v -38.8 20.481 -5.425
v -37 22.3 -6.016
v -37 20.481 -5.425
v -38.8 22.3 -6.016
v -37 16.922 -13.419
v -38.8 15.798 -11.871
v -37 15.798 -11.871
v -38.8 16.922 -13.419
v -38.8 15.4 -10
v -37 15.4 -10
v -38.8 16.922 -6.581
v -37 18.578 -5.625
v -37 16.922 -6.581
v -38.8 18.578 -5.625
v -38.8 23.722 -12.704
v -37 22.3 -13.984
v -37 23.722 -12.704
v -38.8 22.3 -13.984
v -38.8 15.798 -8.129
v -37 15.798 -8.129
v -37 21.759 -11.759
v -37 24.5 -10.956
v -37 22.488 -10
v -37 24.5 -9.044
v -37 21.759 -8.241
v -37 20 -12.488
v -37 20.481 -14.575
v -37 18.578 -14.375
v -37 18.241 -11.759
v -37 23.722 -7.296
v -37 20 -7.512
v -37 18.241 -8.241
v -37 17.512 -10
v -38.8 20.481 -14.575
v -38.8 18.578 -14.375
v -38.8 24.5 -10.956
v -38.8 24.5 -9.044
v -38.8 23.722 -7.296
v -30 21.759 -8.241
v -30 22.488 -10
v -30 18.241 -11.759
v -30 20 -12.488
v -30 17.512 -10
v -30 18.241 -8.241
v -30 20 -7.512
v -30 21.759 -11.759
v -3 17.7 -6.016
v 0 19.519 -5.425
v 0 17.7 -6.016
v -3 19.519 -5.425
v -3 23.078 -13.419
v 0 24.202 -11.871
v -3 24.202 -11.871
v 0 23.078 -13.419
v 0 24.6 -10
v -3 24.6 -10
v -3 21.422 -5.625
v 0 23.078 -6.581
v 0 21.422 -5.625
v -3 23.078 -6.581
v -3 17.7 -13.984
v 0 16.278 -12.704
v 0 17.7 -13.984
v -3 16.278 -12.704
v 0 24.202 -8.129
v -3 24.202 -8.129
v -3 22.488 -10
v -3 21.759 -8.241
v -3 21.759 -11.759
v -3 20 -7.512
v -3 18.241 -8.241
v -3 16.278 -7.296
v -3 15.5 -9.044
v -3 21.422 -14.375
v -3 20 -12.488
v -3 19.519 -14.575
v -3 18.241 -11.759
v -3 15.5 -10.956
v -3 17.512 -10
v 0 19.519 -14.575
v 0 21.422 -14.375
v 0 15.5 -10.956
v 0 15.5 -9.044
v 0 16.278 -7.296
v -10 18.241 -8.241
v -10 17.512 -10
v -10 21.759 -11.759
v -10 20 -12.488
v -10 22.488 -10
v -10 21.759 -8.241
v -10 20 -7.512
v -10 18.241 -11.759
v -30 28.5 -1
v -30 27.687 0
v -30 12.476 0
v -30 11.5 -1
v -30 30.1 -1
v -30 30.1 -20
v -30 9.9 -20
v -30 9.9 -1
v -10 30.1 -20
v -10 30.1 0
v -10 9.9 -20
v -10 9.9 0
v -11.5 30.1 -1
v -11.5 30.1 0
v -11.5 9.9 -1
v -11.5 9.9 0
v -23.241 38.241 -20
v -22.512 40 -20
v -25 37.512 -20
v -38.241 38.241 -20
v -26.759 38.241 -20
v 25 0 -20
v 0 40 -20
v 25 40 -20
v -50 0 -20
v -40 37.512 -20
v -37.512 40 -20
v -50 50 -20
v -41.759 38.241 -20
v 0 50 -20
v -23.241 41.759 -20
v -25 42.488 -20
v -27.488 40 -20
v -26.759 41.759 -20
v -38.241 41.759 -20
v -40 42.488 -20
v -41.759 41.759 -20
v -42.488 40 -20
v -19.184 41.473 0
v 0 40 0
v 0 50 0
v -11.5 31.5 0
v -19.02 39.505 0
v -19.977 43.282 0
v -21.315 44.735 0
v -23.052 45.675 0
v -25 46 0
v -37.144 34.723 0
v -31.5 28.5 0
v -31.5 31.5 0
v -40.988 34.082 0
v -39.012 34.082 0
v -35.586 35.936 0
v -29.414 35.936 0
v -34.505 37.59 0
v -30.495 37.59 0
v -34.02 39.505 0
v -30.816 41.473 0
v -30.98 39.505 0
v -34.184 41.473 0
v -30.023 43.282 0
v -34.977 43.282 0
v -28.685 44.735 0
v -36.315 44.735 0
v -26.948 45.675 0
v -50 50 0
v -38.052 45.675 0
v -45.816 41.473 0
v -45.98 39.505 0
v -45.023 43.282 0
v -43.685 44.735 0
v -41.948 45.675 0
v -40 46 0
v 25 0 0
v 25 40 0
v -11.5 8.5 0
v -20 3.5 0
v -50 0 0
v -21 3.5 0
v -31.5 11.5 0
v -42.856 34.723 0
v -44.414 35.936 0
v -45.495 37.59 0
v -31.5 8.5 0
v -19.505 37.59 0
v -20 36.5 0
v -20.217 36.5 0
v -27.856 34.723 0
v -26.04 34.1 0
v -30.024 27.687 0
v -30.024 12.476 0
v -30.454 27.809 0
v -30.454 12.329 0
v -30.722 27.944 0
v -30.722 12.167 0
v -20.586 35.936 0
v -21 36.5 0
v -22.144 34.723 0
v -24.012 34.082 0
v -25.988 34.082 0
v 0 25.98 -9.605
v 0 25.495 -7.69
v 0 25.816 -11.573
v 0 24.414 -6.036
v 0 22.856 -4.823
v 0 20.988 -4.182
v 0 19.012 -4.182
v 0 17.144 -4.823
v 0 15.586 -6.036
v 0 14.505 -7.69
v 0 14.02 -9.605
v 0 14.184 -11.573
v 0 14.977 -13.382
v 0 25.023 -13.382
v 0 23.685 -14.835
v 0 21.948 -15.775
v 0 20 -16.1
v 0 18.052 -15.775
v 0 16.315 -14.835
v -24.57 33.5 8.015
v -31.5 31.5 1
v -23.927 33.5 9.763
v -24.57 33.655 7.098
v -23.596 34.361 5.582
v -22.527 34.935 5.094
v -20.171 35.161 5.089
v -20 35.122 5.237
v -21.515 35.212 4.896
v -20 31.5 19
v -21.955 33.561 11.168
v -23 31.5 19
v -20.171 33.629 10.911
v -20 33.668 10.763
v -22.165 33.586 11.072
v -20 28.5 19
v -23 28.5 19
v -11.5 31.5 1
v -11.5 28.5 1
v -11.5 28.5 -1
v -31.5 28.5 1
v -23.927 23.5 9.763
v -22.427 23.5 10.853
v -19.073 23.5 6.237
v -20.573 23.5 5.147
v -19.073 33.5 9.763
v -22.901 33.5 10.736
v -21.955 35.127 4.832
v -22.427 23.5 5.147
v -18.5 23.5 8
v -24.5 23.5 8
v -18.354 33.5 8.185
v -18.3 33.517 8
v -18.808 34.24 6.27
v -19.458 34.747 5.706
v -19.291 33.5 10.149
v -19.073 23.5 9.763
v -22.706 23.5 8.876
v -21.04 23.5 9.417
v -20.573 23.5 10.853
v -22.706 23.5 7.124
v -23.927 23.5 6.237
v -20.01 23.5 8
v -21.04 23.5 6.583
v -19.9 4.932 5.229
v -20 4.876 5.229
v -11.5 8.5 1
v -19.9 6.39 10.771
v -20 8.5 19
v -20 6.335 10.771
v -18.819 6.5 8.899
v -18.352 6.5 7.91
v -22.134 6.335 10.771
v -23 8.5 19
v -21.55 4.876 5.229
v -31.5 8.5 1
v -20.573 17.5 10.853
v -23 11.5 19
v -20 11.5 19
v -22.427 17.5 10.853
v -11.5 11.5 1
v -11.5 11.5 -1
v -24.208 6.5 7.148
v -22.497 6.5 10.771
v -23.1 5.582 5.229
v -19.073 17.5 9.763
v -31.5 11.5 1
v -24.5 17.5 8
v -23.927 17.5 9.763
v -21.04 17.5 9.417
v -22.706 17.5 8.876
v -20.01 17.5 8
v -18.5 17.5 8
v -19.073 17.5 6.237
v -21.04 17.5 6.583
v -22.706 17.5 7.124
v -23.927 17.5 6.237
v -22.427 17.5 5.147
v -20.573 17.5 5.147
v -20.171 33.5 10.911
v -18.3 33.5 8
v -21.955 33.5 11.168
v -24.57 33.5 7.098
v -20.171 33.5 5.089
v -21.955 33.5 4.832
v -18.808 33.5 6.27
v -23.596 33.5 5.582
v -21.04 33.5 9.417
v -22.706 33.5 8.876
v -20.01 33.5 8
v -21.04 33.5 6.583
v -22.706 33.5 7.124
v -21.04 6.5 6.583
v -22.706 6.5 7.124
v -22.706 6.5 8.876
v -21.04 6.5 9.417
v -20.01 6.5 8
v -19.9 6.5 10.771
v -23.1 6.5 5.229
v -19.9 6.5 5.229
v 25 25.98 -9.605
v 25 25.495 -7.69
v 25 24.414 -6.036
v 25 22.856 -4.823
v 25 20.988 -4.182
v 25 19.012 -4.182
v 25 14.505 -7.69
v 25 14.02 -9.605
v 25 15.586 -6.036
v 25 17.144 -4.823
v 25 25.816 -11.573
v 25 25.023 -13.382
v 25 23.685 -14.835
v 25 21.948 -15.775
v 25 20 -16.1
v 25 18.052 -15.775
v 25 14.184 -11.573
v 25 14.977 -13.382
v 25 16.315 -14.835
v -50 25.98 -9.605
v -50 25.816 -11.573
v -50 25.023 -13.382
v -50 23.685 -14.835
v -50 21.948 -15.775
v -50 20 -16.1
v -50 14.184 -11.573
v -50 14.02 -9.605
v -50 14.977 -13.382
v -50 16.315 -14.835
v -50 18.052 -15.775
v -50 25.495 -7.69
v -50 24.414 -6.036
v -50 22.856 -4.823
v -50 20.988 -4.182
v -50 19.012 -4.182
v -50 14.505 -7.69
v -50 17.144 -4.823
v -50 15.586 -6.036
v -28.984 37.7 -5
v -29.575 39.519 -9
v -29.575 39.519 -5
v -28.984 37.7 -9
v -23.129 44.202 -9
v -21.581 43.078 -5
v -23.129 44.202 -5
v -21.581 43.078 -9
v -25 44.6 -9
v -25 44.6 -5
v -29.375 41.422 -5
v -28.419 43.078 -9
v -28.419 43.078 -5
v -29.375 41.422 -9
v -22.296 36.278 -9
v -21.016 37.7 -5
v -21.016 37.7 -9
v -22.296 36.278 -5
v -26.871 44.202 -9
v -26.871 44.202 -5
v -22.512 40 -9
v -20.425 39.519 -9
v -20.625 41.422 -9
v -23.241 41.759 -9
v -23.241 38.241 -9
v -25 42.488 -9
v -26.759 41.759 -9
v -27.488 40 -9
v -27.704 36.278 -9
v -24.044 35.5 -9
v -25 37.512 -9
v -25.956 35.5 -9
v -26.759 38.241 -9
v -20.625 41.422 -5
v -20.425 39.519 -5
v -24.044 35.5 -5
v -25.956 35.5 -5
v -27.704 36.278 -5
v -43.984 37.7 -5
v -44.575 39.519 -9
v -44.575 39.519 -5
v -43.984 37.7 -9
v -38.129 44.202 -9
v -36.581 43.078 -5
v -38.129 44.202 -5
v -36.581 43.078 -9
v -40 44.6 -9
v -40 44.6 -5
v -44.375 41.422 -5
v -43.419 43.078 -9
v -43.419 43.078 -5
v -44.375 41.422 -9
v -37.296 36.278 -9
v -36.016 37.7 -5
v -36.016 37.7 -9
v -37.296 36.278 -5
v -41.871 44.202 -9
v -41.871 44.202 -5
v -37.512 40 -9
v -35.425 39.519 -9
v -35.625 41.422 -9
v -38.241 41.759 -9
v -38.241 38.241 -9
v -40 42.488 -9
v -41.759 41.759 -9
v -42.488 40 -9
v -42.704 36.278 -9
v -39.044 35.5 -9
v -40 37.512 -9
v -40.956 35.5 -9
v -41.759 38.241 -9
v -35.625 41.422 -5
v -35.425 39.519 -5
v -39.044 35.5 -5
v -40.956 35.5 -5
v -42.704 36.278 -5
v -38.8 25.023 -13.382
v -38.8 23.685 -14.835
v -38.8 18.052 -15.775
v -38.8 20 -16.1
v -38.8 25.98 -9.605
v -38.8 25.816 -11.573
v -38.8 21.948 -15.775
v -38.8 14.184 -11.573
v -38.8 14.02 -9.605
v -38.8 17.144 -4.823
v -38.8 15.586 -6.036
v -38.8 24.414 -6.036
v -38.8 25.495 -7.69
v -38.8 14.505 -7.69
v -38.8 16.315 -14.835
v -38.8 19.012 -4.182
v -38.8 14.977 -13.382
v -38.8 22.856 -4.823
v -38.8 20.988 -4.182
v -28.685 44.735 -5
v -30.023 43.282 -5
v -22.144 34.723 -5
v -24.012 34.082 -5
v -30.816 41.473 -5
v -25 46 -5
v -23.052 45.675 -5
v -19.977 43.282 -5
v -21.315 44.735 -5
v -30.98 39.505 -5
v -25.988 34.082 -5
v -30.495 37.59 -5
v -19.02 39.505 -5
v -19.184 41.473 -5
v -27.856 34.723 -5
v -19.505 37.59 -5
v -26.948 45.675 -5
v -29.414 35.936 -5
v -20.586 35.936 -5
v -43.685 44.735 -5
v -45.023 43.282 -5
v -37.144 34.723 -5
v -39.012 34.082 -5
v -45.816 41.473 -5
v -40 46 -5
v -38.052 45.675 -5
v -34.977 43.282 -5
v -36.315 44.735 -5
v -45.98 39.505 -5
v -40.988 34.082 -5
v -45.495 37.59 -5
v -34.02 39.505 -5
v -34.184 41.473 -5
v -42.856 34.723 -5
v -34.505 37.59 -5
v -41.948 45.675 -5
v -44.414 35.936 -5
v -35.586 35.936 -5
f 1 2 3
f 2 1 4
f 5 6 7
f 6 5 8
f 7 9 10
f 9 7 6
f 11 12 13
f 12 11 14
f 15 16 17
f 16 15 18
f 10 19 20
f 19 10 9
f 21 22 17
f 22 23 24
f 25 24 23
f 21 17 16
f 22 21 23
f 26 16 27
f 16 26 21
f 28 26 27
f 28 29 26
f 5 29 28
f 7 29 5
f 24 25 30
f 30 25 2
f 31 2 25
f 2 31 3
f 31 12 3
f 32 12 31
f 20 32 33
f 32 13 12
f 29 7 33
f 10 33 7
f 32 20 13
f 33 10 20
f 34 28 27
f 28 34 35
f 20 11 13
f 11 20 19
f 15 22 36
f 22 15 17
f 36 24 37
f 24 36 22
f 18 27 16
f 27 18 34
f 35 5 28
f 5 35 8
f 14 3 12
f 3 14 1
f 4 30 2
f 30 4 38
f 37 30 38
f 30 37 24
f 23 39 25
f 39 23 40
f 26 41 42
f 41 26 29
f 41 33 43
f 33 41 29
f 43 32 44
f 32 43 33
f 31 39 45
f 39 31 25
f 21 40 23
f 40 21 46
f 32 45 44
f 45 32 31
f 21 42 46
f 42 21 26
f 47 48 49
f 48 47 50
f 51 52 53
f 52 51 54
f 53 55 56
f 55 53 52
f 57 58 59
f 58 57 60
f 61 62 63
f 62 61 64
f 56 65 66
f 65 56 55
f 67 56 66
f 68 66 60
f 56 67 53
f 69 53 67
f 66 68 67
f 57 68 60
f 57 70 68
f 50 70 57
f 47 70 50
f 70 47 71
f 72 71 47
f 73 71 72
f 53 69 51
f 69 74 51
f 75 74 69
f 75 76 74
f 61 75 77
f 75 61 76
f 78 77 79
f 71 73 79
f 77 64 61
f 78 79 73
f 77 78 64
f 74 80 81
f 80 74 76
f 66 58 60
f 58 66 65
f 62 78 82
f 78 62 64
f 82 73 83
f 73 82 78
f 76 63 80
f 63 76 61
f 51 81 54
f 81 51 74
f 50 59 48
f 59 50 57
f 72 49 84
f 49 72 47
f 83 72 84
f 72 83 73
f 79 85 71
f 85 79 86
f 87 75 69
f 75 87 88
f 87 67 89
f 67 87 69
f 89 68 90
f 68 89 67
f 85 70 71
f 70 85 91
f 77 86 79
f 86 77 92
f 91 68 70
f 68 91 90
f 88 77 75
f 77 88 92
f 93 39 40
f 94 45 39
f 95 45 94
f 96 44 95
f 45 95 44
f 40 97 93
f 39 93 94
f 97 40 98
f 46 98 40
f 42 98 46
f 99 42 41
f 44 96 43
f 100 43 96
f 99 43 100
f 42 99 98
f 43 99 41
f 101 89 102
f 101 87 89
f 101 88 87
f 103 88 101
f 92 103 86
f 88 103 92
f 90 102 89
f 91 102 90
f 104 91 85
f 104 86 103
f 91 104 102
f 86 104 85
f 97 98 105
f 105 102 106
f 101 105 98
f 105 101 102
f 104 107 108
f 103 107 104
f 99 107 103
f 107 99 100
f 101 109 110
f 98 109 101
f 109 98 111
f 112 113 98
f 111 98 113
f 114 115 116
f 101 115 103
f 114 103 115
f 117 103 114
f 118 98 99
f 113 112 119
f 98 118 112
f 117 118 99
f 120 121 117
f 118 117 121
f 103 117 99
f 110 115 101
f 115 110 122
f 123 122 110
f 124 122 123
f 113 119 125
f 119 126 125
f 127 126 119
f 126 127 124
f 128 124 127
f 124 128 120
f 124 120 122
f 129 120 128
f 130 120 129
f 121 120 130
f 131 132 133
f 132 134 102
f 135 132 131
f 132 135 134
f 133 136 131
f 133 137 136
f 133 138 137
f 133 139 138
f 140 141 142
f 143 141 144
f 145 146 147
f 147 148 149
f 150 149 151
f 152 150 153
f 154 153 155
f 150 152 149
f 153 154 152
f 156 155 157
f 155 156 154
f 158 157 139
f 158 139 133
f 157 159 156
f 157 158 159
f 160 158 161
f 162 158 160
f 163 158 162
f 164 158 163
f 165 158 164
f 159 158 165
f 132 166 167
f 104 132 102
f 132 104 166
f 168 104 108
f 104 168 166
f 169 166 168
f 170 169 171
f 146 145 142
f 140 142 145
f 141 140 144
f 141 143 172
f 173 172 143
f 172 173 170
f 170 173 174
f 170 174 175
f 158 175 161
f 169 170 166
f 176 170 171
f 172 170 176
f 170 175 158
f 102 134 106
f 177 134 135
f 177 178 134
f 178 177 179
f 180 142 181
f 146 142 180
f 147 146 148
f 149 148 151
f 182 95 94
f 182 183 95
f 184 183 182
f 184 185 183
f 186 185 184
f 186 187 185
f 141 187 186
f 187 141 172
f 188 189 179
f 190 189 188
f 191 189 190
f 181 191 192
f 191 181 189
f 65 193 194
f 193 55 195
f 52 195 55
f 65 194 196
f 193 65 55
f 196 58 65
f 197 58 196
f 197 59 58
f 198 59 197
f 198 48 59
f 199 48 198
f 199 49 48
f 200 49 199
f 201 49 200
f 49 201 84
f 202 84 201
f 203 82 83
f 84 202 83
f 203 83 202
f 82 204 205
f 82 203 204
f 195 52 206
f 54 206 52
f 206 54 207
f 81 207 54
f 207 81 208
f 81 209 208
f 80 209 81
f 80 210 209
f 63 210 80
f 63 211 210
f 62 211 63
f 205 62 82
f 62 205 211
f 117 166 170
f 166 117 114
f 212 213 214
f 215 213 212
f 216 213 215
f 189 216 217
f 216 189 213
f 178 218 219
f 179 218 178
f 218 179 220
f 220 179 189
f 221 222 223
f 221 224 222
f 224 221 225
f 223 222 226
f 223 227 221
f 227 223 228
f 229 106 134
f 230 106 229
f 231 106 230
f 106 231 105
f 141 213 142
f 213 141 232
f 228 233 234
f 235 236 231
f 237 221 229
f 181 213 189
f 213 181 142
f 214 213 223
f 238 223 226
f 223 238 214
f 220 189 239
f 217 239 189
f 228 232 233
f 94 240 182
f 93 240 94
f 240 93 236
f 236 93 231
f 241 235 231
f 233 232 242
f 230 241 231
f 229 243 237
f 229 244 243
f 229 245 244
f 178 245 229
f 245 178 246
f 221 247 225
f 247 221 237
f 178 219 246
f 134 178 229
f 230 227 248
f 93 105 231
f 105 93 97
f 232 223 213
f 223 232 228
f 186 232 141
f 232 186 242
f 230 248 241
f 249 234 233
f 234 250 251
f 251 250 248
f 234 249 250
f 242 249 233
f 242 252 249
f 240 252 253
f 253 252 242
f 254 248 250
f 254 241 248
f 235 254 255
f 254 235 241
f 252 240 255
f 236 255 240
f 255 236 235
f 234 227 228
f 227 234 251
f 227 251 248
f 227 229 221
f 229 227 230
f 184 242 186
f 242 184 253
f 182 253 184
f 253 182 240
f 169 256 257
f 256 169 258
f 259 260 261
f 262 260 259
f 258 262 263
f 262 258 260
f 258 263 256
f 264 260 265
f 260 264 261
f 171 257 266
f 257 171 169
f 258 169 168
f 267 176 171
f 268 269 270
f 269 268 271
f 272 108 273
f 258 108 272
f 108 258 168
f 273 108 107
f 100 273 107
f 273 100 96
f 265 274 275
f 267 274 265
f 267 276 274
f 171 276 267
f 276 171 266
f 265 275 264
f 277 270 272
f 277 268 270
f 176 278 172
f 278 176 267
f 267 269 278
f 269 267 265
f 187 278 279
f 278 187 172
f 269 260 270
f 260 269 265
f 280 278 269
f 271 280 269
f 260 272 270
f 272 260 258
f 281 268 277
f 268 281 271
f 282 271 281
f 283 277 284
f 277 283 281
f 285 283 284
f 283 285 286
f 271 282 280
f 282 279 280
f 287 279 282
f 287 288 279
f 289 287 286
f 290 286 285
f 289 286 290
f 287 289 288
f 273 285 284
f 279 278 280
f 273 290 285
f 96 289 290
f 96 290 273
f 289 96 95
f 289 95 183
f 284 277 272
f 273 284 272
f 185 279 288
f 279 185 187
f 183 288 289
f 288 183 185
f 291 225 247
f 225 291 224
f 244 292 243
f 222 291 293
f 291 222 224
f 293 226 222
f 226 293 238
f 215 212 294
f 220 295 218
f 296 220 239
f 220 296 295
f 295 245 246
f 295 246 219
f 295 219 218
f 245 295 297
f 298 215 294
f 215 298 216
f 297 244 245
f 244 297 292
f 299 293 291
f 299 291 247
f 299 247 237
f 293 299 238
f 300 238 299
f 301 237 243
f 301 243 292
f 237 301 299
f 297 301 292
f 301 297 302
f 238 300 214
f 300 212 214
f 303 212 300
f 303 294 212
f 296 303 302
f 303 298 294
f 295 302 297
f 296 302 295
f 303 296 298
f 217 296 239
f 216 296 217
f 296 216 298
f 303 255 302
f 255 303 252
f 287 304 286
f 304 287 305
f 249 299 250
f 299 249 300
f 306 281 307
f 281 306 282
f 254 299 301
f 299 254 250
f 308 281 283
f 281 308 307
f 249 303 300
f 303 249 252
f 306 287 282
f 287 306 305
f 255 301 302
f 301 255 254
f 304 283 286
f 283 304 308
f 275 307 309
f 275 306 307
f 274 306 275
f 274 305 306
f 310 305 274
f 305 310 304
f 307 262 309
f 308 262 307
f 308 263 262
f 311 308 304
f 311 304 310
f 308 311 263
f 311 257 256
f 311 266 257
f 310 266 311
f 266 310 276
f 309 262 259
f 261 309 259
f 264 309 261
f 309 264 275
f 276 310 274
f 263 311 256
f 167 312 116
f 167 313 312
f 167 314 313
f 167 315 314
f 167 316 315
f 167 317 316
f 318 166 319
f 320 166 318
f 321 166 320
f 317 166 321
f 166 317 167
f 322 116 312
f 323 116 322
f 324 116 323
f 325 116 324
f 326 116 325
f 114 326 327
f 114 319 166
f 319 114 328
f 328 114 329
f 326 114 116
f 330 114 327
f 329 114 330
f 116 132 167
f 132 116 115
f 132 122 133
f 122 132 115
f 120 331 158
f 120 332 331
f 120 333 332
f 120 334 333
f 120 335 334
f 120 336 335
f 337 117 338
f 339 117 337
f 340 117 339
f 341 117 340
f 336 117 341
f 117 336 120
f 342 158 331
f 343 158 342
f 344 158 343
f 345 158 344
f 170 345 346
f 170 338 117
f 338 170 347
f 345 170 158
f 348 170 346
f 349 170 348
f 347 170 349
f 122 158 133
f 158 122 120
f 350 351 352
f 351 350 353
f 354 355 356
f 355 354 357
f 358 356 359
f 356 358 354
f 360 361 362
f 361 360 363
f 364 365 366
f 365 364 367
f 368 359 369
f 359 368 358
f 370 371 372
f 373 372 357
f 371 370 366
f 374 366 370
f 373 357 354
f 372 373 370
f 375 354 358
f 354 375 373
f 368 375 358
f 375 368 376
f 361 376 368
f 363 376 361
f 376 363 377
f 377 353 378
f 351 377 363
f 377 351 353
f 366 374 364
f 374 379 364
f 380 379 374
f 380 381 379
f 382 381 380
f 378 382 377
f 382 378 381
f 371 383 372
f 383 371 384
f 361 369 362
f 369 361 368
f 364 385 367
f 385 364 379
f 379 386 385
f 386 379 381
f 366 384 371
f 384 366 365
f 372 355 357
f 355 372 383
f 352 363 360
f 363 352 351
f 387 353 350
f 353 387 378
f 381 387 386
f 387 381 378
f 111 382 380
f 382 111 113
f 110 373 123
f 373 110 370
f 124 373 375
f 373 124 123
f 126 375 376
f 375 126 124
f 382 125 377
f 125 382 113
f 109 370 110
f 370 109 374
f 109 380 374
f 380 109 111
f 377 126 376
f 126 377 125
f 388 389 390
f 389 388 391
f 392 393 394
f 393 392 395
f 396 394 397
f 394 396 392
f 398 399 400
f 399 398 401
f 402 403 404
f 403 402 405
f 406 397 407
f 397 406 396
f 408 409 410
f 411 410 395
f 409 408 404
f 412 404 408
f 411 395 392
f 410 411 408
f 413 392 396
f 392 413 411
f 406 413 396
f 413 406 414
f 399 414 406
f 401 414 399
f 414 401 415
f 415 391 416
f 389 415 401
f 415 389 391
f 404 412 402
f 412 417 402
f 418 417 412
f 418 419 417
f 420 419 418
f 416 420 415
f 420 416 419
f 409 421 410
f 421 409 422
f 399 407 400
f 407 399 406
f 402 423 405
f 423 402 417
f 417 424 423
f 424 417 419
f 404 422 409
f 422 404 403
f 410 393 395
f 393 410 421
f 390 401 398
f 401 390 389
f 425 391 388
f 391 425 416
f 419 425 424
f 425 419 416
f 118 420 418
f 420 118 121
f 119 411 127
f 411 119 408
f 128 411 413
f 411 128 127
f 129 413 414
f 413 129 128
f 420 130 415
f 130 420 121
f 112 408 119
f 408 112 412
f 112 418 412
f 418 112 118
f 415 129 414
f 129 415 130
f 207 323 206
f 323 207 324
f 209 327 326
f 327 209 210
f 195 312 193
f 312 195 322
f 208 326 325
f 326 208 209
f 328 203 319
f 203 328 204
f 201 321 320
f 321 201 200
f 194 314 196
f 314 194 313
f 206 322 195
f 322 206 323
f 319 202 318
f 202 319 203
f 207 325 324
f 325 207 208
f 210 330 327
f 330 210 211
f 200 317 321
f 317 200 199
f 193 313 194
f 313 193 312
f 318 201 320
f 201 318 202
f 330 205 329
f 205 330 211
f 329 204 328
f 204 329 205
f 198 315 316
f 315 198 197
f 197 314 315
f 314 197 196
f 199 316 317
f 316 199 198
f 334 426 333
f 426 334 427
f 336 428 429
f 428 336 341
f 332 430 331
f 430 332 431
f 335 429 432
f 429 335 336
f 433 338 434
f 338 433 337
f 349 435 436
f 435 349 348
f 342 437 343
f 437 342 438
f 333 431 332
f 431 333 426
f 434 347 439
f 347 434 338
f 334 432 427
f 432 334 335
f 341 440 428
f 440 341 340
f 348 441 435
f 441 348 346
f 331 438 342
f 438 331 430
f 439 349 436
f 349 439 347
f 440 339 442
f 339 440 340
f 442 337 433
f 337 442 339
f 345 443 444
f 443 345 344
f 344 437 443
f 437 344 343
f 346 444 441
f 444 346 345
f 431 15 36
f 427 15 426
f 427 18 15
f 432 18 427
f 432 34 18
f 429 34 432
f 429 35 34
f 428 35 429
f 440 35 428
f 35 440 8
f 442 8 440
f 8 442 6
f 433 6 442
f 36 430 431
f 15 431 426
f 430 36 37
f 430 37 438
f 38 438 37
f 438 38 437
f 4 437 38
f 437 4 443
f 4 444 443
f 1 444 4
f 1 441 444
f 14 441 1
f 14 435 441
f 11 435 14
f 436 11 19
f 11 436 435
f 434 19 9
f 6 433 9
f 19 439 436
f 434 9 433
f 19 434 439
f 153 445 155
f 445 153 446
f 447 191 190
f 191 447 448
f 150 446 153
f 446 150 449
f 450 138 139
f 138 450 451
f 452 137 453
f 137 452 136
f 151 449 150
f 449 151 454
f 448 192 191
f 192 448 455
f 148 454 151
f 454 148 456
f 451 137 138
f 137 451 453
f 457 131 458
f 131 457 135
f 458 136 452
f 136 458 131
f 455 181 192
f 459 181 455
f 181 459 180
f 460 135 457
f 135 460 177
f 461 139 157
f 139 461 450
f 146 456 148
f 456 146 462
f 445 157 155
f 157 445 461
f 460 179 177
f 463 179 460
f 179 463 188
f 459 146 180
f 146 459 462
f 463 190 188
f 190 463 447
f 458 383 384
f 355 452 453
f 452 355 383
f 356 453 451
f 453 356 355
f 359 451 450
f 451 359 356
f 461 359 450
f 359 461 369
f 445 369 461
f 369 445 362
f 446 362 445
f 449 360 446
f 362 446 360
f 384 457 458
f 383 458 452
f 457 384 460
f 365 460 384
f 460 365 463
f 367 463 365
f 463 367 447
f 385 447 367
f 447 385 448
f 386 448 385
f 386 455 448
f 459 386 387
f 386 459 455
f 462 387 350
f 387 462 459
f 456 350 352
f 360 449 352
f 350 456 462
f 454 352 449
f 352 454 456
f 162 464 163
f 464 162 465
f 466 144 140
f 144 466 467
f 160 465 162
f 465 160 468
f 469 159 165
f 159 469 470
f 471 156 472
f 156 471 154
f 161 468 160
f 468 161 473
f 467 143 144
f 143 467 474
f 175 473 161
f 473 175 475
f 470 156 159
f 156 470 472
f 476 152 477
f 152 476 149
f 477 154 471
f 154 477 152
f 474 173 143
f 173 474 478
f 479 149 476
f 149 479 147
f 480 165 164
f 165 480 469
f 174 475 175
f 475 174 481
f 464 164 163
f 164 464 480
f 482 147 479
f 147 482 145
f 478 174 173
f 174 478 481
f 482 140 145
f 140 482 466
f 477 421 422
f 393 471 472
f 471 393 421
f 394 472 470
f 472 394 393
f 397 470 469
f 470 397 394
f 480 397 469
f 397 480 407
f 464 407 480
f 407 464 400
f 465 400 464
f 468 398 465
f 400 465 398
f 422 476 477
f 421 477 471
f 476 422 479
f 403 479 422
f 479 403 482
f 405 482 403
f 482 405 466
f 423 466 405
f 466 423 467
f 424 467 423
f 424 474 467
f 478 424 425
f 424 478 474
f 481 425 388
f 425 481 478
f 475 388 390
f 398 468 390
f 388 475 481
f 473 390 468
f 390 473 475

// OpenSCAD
// file: MCAD/constants.scad
// MIT license


TAU = 6.2831853071; //2*PI, see http://tauday.com/
PI = TAU/2;

// translates a imperial measurement in inches to meters
mm_per_inch = 25.4;
// file: MCAD/math.scad
// MIT license

include <constants.scad>

function deg(angle) = 360*angle/TAU;
// file: bom.scad
module bom(code, desc, category) {
	echo(str("BOM: ",code," - ", desc, "; ", category));
}
// file: MCAD/shapes.scad
/*
 *  OpenSCAD Shapes Library (www.openscad.org)
 *  Copyright (C) 2009  Catarina Mota
 *  Copyright (C) 2010  Elmo Mäntynen
 *
 *  License: LGPL 2.1 or later
*/

// 2D Shapes
//ngon(sides, radius, center=false);

// 3D Shapes
//box(width, height, depth);
//roundedBox(width, height, depth, factor);
//cone(height, radius);
//ellipticalCylinder(width, height, depth);
//ellipsoid(width, height);
//tube(height, radius, wall, center = false);
//tube2(height, ID, OD, center = false);
//ovalTube(width, height, depth, wall, center = false);
//hexagon(height, depth);
//octagon(height, depth);
//dodecagon(height, depth);
//hexagram(height, depth);
//rightTriangle(adjacent, opposite, depth);
//equiTriangle(side, depth);
//12ptStar(height, depth);

//----------------------

// size is a vector [w, h, d]
module box(width, height, depth) {
  cube([width, height, depth], true);
}

// size is a vector [w, h, d]
module roundedBox(width, height, depth, radius) {
  size=[width, height, depth];
  cube(size - [2*radius,0,0], true);
  cube(size - [0,2*radius,0], true);
  for (x = [radius-size[0]/2, -radius+size[0]/2],
       y = [radius-size[1]/2, -radius+size[1]/2]) {
    translate([x,y,0]) cylinder(r=radius, h=size[2], center=true);
  }
}

module cone(height, radius, center = false) {
  cylinder(height, radius, 0, center);
}

module ellipticalCylinder(w,h, height, center = false) {
  scale([1, h/w, 1]) cylinder(h=height, r=w, center=center);
}

module ellipsoid(w, h, center = false) {
  scale([1, h/w, 1]) sphere(r=w/2, center=center);
}

// wall is wall thickness
module tube(height, radius, wall, center = false) {
  difference() {
    cylinder(h=height, r=radius, center=center);
    cylinder(h=height, r=radius-wall, center=center);
  }
}

// wall is wall thickness
module tube2(height, ID, OD, center = false) {
  difference() {
    cylinder(h=height, r=OD/2, center=center);
    cylinder(h=height, r=ID/2, center=center);
  }
}

// wall is wall thickness
module ovalTube(height, rx, ry, wall, center = false) {
  difference() {
    scale([1, ry/rx, 1]) cylinder(h=height, r=rx, center=center);
    scale([(rx-wall)/rx, (ry-wall)/rx, 1]) cylinder(h=height, r=rx, center=center);
  }
}

// size is the XY plane size, height in Z
module hexagon(size, height) {
  boxWidth = size/1.75;
  for (r = [-60, 0, 60]) rotate([0,0,r]) cube([boxWidth, size, height], true);
}

// size is the XY plane size, height in Z
module octagon(size, height) {
  intersection() {
    cube([size, size, height], true);
    rotate([0,0,45]) cube([size, size, height], true);
  }
}

// size is the XY plane size, height in Z
module dodecagon(size, height) {
  intersection() {
    hexagon(size, height);
    rotate([0,0,90]) hexagon(size, height);
  }
}

// size is the XY plane size, height in Z
module hexagram(size, height) {
  boxWidth=size/1.75;
  for (v = [[0,1],[0,-1],[1,-1]]) {
    intersection() {
      rotate([0,0,60*v[0]]) cube([size, boxWidth, height], true);
      rotate([0,0,60*v[1]]) cube([size, boxWidth, height], true);
    }
  }
}

module rightTriangle(adjacent, opposite, height) {
  difference() {
    translate([-adjacent/2,opposite/2,0]) cube([adjacent, opposite, height], true);
    translate([-adjacent,0,0]) {
      rotate([0,0,atan(opposite/adjacent)]) dislocateBox(adjacent*2, opposite, height+2);
    }
  }
}

module equiTriangle(side, height) {
  difference() {
    translate([-side/2,side/2,0]) cube([side, side, height], true);
    rotate([0,0,30]) dislocateBox(side*2, side, height);
    translate([-side,0,0]) {
      rotate([0,0,60]) dislocateBox(side*2, side, height);
    }
  }
}

module 12ptStar(size, height) {
  starNum = 3;
  starAngle = 360/starNum;
  for (s = [1:starNum]) {
    rotate([0, 0, s*starAngle]) cube([size, size, height], true);
  }
}

//-----------------------
//MOVES THE ROTATION AXIS OF A BOX FROM ITS CENTER TO THE BOTTOM LEFT CORNER
module dislocateBox(w, h, d) {
  translate([0,0,-d/2]) cube([w,h,d]);
}

//-----------------------
// Tests
//module test2D_ellipse(){ellipse(10, 5);}
module test_ellipsoid(){ellipsoid(10, 5);}

//module test2D_egg_outline(){egg_outline();}
// file: MCAD/motors.scad
// Copyright 2010 D1plo1d

// This library is dual licensed under the GPL 3.0 and the GNU Lesser General Public License as per http://creativecommons.org/licenses/LGPL/2.1/ .

include <math.scad>


//generates a motor mount for the specified nema standard #.
module stepper_motor_mount(nema_standard,slide_distance=0, mochup=true, tolerance=0) {
	//dimensions from:
	// http://www.numberfactory.com/NEMA%20Motor%20Dimensions.htm
	if (nema_standard == 17)
	{
		_stepper_motor_mount(
			motor_shaft_diameter = 0.1968*mm_per_inch,
			motor_shaft_length = 0.945*mm_per_inch,
			pilot_diameter = 0.866*mm_per_inch,
			pilot_length = 0.80*mm_per_inch,
			mounting_bolt_circle = 1.725*mm_per_inch,
			bolt_hole_size = 3.5,
			bolt_hole_distance = 1.220*mm_per_inch,
			slide_distance = slide_distance,
			mochup = mochup,
			tolerance=tolerance);
	}
	if (nema_standard == 23)
	{
		_stepper_motor_mount(
			motor_shaft_diameter = 0.250*mm_per_inch,
			motor_shaft_length = 0.81*mm_per_inch,
			pilot_diameter = 1.500*mm_per_inch,
			pilot_length = 0.062*mm_per_inch,
			mounting_bolt_circle = 2.625*mm_per_inch,
			bolt_hole_size = 0.195*mm_per_inch,
			bolt_hole_distance = 1.856*mm_per_inch,
			slide_distance = slide_distance,
			mochup = mochup,
			tolerance=tolerance);
	}
	
}


//inner mehod for creating a stepper motor mount of any dimensions
module _stepper_motor_mount(
	motor_shaft_diameter,
	motor_shaft_length,
	pilot_diameter,
	pilot_length,
	mounting_bolt_circle,
	bolt_hole_size,
	bolt_hole_distance,
	slide_distance = 0,
	motor_length = 40, //arbitray - not standardized
	mochup,
	tolerance = 0
)
{
	union()
	{
	// == centered mount points ==
	//mounting circle inset
	translate([0,slide_distance/2,0]) circle(r = pilot_diameter/2 + tolerance);
	square([pilot_diameter,slide_distance],center=true);
	translate([0,-slide_distance/2,0]) circle(r = pilot_diameter/2 + tolerance);

	//todo: motor shaft hole
	
	//mounting screw holes
	for (x = [-1,1])
	{
		for (y = [-1,1])
		{
			translate([x*bolt_hole_distance/2,y*bolt_hole_distance/2,0])
			{
				translate([0,slide_distance/2,0]) circle(bolt_hole_size/2 + tolerance);
				translate([0,-slide_distance/2,0]) circle(bolt_hole_size/2 + tolerance);
				square([bolt_hole_size+2*tolerance,slide_distance],center=true);
			}
		}
	}
	// == motor mock-up ==
	//motor box
	if (mochup == true)
	{
		%translate([0,0,-5]) cylinder(h = 5, r = pilot_diameter/2);
		%translate(v=[0,0,-motor_length/2])
		{
			cube(size=[bolt_hole_distance+bolt_hole_size+5,bolt_hole_distance+bolt_hole_size+5,motor_length], center = true);
		}
		//shaft
		%translate(v=[0,0,-(motor_length-motor_shaft_length-2)/2])
		{
			%cylinder(r=motor_shaft_diameter/2,h=motor_length+motor_shaft_length--1, center = true);
		}
	}
	}
}
// file: MCAD/materials.scad
/*
 * Material colors.
 * 
 * Originally by Hans Häggström, 2010.
 * Dual licenced under Creative Commons Attribution-Share Alike 3.0 and LGPL2 or later
 */

// Material colors
Oak = [0.65, 0.5, 0.4];
Pine = [0.85, 0.7, 0.45];
Birch = [0.9, 0.8, 0.6];
FiberBoard = [0.7, 0.67, 0.6];
BlackPaint = [0.2, 0.2, 0.2];
Iron = [0.36, 0.33, 0.33];
Steel = [0.65, 0.67, 0.72];
Stainless = [0.45, 0.43, 0.5];
Aluminum = [0.77, 0.77, 0.8];
Brass = [0.88, 0.78, 0.5];
Transparent = [1, 1, 1, 0.2];

// Example, uncomment to view
//color_demo();

module color_demo(){
    // Wood
    colorTest(Oak, 0, 0);
    colorTest(Pine, 1, 0);
    colorTest(Birch, 2, 0);

    // Metals
    colorTest(Iron, 0, 1);
    colorTest(Steel, 1, 1);
    colorTest(Stainless, 2, 1);
    colorTest(Aluminum, 3, 1);

    // Mixboards
    colorTest(FiberBoard, 0, 2);

    // Paints
    colorTest(BlackPaint, 0, 3);
}

module colorTest(col, row=0, c=0) {
  color(col) translate([row * 30,c*30,0]) sphere(r=10);
}
// file: MCAD/units.scad
/*
 * Basic units.
 * 
 * Originally by Hans Häggström, 2010.
 * Dual licenced under Creative Commons Attribution-Share Alike 3.0 and LGPL2 or later
 */


mm = 1;
cm = 10 * mm;
dm = 100 * mm;
m = 1000 * mm;

inch = 25.4 * mm;

X = [1, 0, 0];
Y = [0, 1, 0];
Z = [0, 0, 1];

M3 = 3*mm;
M4 = 4*mm;
M5 = 5*mm;
M6 = 6*mm;
M8 = 8*mm;


// When a small distance is needed to overlap shapes for boolean cutting, etc.
epsilon = 0.01*mm;
// file: vslot.scad
include <MCAD/units.scad>;
include <MCAD/materials.scad>
use <MCAD/shapes.scad>;
use <bom.scad>;

vslot_color_black = [0.27, 0.27, 0.3];
vslot_color = Aluminum;

module vslot(length=50, sections=1, finish, cutout=0) {
	size = sections * 20;
	bom(str("vslot20x", size, "x", length), str("v-slot 20x", size, " (", length , "mm)"), ["rail", "extrusion", "structure"]);
	cutext = [[12.00,4.50],[10.00,4.50],[8.20,2.78],[8.20,5.50],[6.56,5.50],[3.90,2.84],[3.90,0.21],[3.69,0.00],[3.90,-0.21],[3.90,-2.84],[6.56,-5.50],[8.20,-5.50],[8.20,-2.78],[10.00,-4.50],[12.00,-4.50]];
	cutint = [[16.10,0.21],[16.10,2.84],[12.70,6.24],[12.70,8.78],[7.30,8.78],[7.30,6.24],[3.90,2.84],[3.90,0.21],[3.69,0.00],[3.90,-0.21],[3.90,-2.84],[7.30,-6.24],[7.30,-8.78],[12.70,-8.78],[12.70,-6.24],[16.10,-2.84],[16.10,-0.21],[16.31,0.00],];
	cutcorner = [[8.20,8.20],[6.57,8.20],[6.57,7.66],[7.66,6.57],[8.20,6.57]];

	module profile() {
        
		difference() {
         
			translate([0,0,length/2])
			roundedBox(20 * sections, 20, length, 1.5);
         if (cutout == 0){
			for(i = [0,180]) rotate([0,0,-i]) translate([10 * (sections - 1), 0, -epsilon/2]) {
				linear_extrude(length+20) polygon(cutext);
				translate([5,-2.89,-20]) cube([10,5.78,length+40]);
			}
          
			for(i = [90,270]) rotate([0,0,-i])
				for(j = [0:sections-1]) translate([0, (sections - 1) * 10 - 20 * j, -epsilon/2]) {
					linear_extrude(length+epsilon) polygon(cutext);
					translate([5,-2.89,-20]) cube([10,5.78,length+40]);
				}

			for(i = [0:sections-1]) translate([i * 20 - 10 * (sections - 1),0,-epsilon/2])
				cylinder(length+20, 2.1, 2.1);

			for(i = [90,270]) rotate([0,0,-i])
				translate([0,(sections - 1) * 10,-epsilon/2])
				linear_extrude(length+epsilon) polygon(cutcorner);
			for(i = [ 0,180]) rotate([0,0,-i])
				translate([(sections - 1) * 10,0,-epsilon/2])
				linear_extrude(length+epsilon) polygon(cutcorner);

			if(sections > 1)
				for(i = [0:sections-2]) translate([(sections - 3) * 10 - i * 20, 0, -epsilon/2])
					linear_extrude(length+epsilon) polygon(cutint);
                      }
		}
	}

      if (cutout == 1){
		 translate([0,0,length/2]) box(20 * sections, 20.2, length);
          } else {
	     if(finish)
		   color(finish) profile();
	     else
		   color(vslot_color) profile();
         }
}

module vslot20x20(length, finish) { vslot(length, 1, finish); }
module vslot20x20_cutout(length, finish) { vslot(length, 1, finish, 1); }


module vslot20x40(length, finish) { vslot(length, 2, finish); }
module vslot20x40_cutout(length, finish) { vslot(length, 2, finish, 1); }

module vslot20x60(length, finish) { vslot(length, 3, finish); }
module vslot20x60_cutout(length, finish) { vslot(length, 3, finish, 1); }

module vslot20x80(length, finish) { vslot(length, 4, finish); }
module vslot20x80_cutout(length, finish) { vslot(length, 4, finish, 1); }


module vslot_test() {
	$fn = 32;

	vslot20x20(100);

	translate([0, 40, 0])
	vslot20x40(100, vslot_color_black);

	translate([0, 80, 0])
	vslot20x60(100);

	translate([0, 120, 0])
	vslot20x80(100, vslot_color_black);

    translate([0,140,0]) vslot20x20_cutout(100);
}

vslot_test();
// file: MCAD/nuts_and_bolts.scad
// Copyright 2010 D1plo1d

// This library is dual licensed under the GPL 3.0 and the GNU Lesser General Public License as per http://creativecommons.org/licenses/LGPL/2.1/ .

//testNutsAndBolts();

module SKIPtestNutsAndBolts()
{
	$fn = 360;
	translate([0,15])nutHole(3, proj=2);
	boltHole(3, length= 30, proj=2);
}

MM = "mm";
INCH = "inch"; //Not yet supported

//Based on: http://www.roymech.co.uk/Useful_Tables/Screws/Hex_Screws.htm
METRIC_NUT_AC_WIDTHS =
[
	-1, //0 index is not used but reduces computation
	-1,
	-1,
	6.40,//m3
	8.10,//m4
	9.20,//m5
	11.50,//m6
	-1,
	15.00,//m8
	-1,
	19.60,//m10
	-1,
	22.10,//m12
	-1,
	-1,
	-1,
	27.70,//m16
	-1,
	-1,
	-1,
	34.60,//m20
	-1,
	-1,
	-1,
	41.60,//m24
	-1,
	-1,
	-1,
	-1,
	-1,
	53.1,//m30
	-1,
	-1,
	-1,
	-1,
	-1,
	63.5//m36
];
METRIC_NUT_THICKNESS =
[
	-1, //0 index is not used but reduces computation
	-1,
	-1,
	2.40,//m3
	3.20,//m4
	4.00,//m5
	5.00,//m6
	-1,
	6.50,//m8
	-1,
	8.00,//m10
	-1,
	10.00,//m12
	-1,
	-1,
	-1,
	13.00,//m16
	-1,
	-1,
	-1,
	16.00//m20
	-1,
	-1,
	-1,
	19.00,//m24
	-1,
	-1,
	-1,
	-1,
	-1,
	24.00,//m30
	-1,
	-1,
	-1,
	-1,
	-1,
	29.00//m36
];

COURSE_METRIC_BOLT_MAJOR_THREAD_DIAMETERS =
[//based on max values
	-1, //0 index is not used but reduces computation
	-1,
	-1,
	2.98,//m3
	3.978,//m4
	4.976,//m5
	5.974,//m6
	-1,
	7.972,//m8
	-1,
	9.968,//m10
	-1,
	11.966,//m12
	-1,
	-1,
	-1,
	15.962,//m16
	-1,
	-1,
	-1,
	19.958,//m20
	-1,
	-1,
	-1,
	23.952,//m24
	-1,
	-1,
	-1,
	-1,
	-1,
	29.947,//m30
	-1,
	-1,
	-1,
	-1,
	-1,
	35.940//m36
];

module nutHole(size, units=MM, tolerance = +0.0001, proj = -1)
{
	//takes a metric screw/nut size and looksup nut dimensions
	radius = METRIC_NUT_AC_WIDTHS[size]/2+tolerance;
	height = METRIC_NUT_THICKNESS[size]+tolerance;
	if (proj == -1)
	{
		cylinder(r= radius, h=height, $fn = 6, center=[0,0]);
	}
	if (proj == 1)
	{
		circle(r= radius, $fn = 6);
	}
	if (proj == 2)
	{
		translate([-radius/2, 0])
			square([radius*2, height]);
	}
}

module boltHole(size, units=MM, length, tolerance = +0.0001, proj = -1)
{
	radius = COURSE_METRIC_BOLT_MAJOR_THREAD_DIAMETERS[size]/2+tolerance;
//TODO: proper screw cap values
	capHeight = METRIC_NUT_THICKNESS[size]+tolerance; //METRIC_BOLT_CAP_HEIGHTS[size]+tolerance;
	capRadius = METRIC_NUT_AC_WIDTHS[size]/2+tolerance; //METRIC_BOLT_CAP_RADIUS[size]+tolerance;

	if (proj == -1)
	{
	translate([0, 0, -capHeight])
		cylinder(r= capRadius, h=capHeight);
	cylinder(r = radius, h = length);
	}
	if (proj == 1)
	{
		circle(r = radius);
	}
	if (proj == 2)
	{
		translate([-capRadius/2, -capHeight])
			square([capRadius*2, capHeight]);
		square([radius*2, length]);
	}
}
// file: pulley.scad
use <MCAD/nuts_and_bolts.scad>;

module pulley_wall(xside)
{
   hull(){
       translate([0,0,0]) cube([20,3,2]);
       translate([8.5,0,18]) cube([3,3,2]);
       if (xside==0){
          translate([8.5,7,0]) cube([1,1,1]);
          translate([10,4,9]) rotate([90,0,0]) cylinder(r=3,h=10);
          
         } else {
          translate([8.5,-5,0]) cube([1,1,1]);
          translate([10,8,9]) rotate([90,0,0]) cylinder(r=3,h=10);
         }
       }
    
}

module pulley_body()
{
    translate([0,0,0])   pulley_wall(1);
    translate([0,20,0])  pulley_wall(0);
    %translate([10,-2,9]) rotate([90,0,180]) boltHole(3,length=28);
    %translate([10,25,9]) rotate([90,0,180]) nutHole(3); 
}

module pulley_cuts()
{
    translate([10,-2,9]) rotate([90,0,180]) boltHole(3,length=28);
    translate([10,25,9]) rotate([90,0,180]) nutHole(3);  
}

module pulley()
{
	difference(){
        translate([23,21,-12]) rotate([90,0,270]) pulley_body();
        translate([23,21,-12]) rotate([90,0,270]) pulley_cuts();
        }
    

}



pulley();
// file: nemamount.scad
include <MCAD/units.scad>;
include <MCAD/materials.scad>
include <MCAD/stepper.scad>
include <MCAD/motors.scad>
use <MCAD/shapes.scad>;
$fn = 32;




module motor_support(ht)
{
   difference(){
	  translate([-22.5,23.5,0]) rotate([90,0,0]) motor_support_body(ht);
      translate([0,1,0]) rotate([90,0,0]) motor_support_cuts(ht);
      }
}

module motor_support_body(ht)
{
	cube([45,ht,48.5]);

}


module motor_support_cuts(ht)
{
// Motor shaft/pulley cutout.
      translate([0,.1,0]) rotate([90, 0, 0]) cylinder(r=12, h=ht*2, center=true, $fn=60);
      // NEMA 17 stepper motor mounting screws.
      for (x = [-1, 1]) for (z = [-1, 1]) {
        scale([x, 1, z]) translate([15.5, .1, 15.5]) {
          rotate([90, 0, 0]) cylinder(r=4, h=ht*2, center=true, $fn=12);
          }
        }
}



module nema_geared_cutout()
{
    //pulley opening
    translate([16,1,21]) rotate([90,0,0]){
      cylinder (h=22, r=6.6);

      rotate([0,0,45]) {
        translate([14,0,0]) cylinder(h=22, r=1.6, $fn=12);
        translate([0,14,0]) cylinder(h=22, r=1.6, $fn=12);
        translate([-14,0,0]) cylinder(h=22, r=1.6, $fn=12);
        translate([0,-14,0]) cylinder(h=22, r=1.6, $fn=12);
      }
     
    }

    //gearhead indentation
    translate([16,-5,21]) rotate([90,0,0]) cylinder (h=3.35, r=11.25);

  
    
}

module nema_cutout()
{
// Motor shaft/pulley cutout.
      rotate([90, 0, 0]) cylinder(r=12, h=20, center=true, $fn=60);
      // NEMA 17 stepper motor mounting screws.
      for (x = [-1, 1]) for (z = [-1, 1]) {
        scale([x, 1, z]) translate([15.5, -5, 15.5]) {
          rotate([90, 0, 0]) cylinder(r=1.65, h=20, center=true, $fn=12);
          }
        }
}

module nema_motor()
{
   union(){
     nema_mount();
     %translate([0,-4,1]) rotate([90,0,0]) motor(Nema17, size=NemaLong , dualAxis=false);
     }
}

module nema_motor_inverse()
{
   union(){
     nema_mount_inverse();
     %translate([0,-4,1]) rotate([90,0,0]) motor(Nema17, size=NemaLong , dualAxis=false);
     }
}

module nema_geared_motor_inverse()
{
   union(){
     nema_geared_inverse();
     %translate([16,-7,22]) rotate([90,0,180]) motor(Nema17, NemaLong, dualAxis=false);
    
     }
}

module nema_geared_motor()
{
   union(){
     nema_geared_mount();
     %translate([16,-7,22]) rotate([90,0,180]) motor(Nema17, NemaLong, dualAxis=false);
    
     }
}

module nema_geared_mount()
{
   difference(){
      union(){
           translate([-6,-6,0]) rotate([90,0,0]) cube([45,45,7]);
           translate([-6,-13,-4]) rotate([0,0,0]) cube([45,25,5]);
           translate([-6,-13,44]) rotate([0,0,0]) cube([45,25,5]);
           }
      translate([0,0,1]) nema_geared_cutout();
      }


}

module nema_geared_inverse()
{
   difference(){
      union(){
           translate([-6,-6,0]) rotate([90,0,0]) cube([45,45,7]);
           translate([-6,-31,-4]) rotate([0,0,0]) cube([45,25,5]);
           translate([-6,-31,44]) rotate([0,0,0]) cube([45,25,5]);
           }
      translate([0,0,1]) nema_geared_cutout();
      }


}

module nema_mount_inverse()
{
   difference(){
      union(){
        translate([-22.5,0,-21.5]) rotate([90,0,0]) cube([45,45,5]);
        translate([-22.5,-5,-25]) rotate([0,0,0]) cube([45,25,5]);
        }
      translate([0,0,1]) nema_cutout();
      }
   //nema_cutout();
}

module nema_mount()
{
   difference(){
      union(){
        translate([-22.5,0,-21.5]) rotate([90,0,0]) cube([45,45,5]);
        translate([-22.5,-25,-25]) rotate([0,0,0]) cube([45,25,5]);
        }
      translate([0,0,1]) nema_cutout();
      }
   //nema_cutout();
}

//nema_motor_inverse();
translate([0,0,40]) rotate([270,0,0]) nema_motor();
translate([0,0,0]) motor_support(40);
//nema_geared_motor();
//nema_geared_motor_inverse();
// file: mountblock.scad
use <vslot.scad>;
use <MCAD/nuts_and_bolts.scad>;


module mountblock_body()
{
	cube([40,40,20]);
	translate([20,20,0]) %vslot20x20(200);
     %translate([37,20,10]) rotate([90,0,270]) boltHole(5, length=18);
     %translate([3,20,10]) rotate([90,0,90]) boltHole(5, length=18);
}


module mountblock_cuts()
{
	translate([20,20,-0.2]) vslot20x20_cutout(80.1);
    translate([37,20,10]) rotate([90,0,270]) boltHole(5, length=18);
    translate([3,20,10]) rotate([90,0,90]) boltHole(5, length=18);
}


module mountblock()
{
	difference(){
         mountblock_body();
         mountblock_cuts();
         }

}


mountblock();
// main file
use <mountblock.scad>;
use <nemamount.scad>;
use <pulley.scad>;
use <MCAD/nuts_and_bolts.scad>;

module pxmotor_body()
{
	translate([0,0,0]) rotate([0,180,0]) mountblock();
	translate([-32.5,19.5,22]) rotate([90,90,0]) pulley();
    translate([0,0,-20]) cube([25,40,20]);
    %translate([20,20,-10]) rotate([0,90,0]) cylinder(r=6,h=45.2);
    translate([0,40,0]) rotate([0,180,0])cube([50,10,20]);
    translate([-40,0,0]) rotate([0,180,0])cube([10,40,20]);
    %translate([-25,40,-3]) rotate([0,180,270]) boltHole(5, length=20);
    %translate([-40,40,-3]) rotate([0,180,270]) boltHole(5, length=20);

   
    
}

module pxmotor_cuts()
{
     translate([0,20,-10.1]) rotate([0,90,0]) cylinder(r=6,h=26.2);
     translate([0,20,-10.1]) rotate([0,90,0]) cylinder(r=6,h=26.2);
     translate([-65,20,-10.1]) rotate([0,90,0]) cylinder(r=6,h=26.2);
     translate([-25,40,0]) rotate([0,180,270]) cylinder(r=6, h=5);
     translate([-40,40,0]) rotate([0,180,270]) cylinder(r=6, h=5);
     translate([-25,40,-9]) rotate([0,180,270]) boltHole(5, length=12);
     translate([-40,40,-9]) rotate([0,180,270]) boltHole(5, length=12);
     
}

module pxmotor()
{
	difference(){
       pxmotor_body();
       pxmotor_cuts();
       }

}

pxmotor();
